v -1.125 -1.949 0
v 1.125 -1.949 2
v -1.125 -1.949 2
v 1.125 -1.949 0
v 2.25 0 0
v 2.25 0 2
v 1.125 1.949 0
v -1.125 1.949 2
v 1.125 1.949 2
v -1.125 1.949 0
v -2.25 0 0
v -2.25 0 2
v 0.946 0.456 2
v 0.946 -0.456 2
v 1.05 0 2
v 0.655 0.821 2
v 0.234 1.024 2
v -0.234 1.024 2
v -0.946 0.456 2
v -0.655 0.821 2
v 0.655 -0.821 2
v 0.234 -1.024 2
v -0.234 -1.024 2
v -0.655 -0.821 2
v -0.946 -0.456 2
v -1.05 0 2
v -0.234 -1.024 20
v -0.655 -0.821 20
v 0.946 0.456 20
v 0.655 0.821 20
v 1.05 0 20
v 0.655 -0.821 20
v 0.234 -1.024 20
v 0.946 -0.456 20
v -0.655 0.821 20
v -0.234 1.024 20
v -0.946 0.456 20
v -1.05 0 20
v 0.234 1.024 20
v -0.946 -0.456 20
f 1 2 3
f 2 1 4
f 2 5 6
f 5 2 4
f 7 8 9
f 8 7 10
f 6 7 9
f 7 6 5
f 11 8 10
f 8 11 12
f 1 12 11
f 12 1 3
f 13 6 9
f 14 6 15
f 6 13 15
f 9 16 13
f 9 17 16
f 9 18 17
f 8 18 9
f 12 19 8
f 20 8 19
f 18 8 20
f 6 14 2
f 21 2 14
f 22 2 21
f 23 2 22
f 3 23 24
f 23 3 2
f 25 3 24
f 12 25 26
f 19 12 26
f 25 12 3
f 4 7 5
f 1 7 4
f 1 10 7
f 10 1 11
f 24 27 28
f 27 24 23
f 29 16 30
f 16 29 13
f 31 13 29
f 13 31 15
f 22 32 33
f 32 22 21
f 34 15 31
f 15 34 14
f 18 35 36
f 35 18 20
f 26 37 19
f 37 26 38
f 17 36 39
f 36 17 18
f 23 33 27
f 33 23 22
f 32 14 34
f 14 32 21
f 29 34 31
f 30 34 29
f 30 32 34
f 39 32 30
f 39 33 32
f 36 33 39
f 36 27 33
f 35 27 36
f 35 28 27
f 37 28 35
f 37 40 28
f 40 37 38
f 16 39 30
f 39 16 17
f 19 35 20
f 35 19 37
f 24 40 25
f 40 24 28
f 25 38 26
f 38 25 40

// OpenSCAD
module m2_bolt_hole () {
    cylinder(d=4.5, h=2, $fn=6);
    cylinder(d=2.1, h=20, $fs = 0.5);     
}

m2_bolt_hole ();
